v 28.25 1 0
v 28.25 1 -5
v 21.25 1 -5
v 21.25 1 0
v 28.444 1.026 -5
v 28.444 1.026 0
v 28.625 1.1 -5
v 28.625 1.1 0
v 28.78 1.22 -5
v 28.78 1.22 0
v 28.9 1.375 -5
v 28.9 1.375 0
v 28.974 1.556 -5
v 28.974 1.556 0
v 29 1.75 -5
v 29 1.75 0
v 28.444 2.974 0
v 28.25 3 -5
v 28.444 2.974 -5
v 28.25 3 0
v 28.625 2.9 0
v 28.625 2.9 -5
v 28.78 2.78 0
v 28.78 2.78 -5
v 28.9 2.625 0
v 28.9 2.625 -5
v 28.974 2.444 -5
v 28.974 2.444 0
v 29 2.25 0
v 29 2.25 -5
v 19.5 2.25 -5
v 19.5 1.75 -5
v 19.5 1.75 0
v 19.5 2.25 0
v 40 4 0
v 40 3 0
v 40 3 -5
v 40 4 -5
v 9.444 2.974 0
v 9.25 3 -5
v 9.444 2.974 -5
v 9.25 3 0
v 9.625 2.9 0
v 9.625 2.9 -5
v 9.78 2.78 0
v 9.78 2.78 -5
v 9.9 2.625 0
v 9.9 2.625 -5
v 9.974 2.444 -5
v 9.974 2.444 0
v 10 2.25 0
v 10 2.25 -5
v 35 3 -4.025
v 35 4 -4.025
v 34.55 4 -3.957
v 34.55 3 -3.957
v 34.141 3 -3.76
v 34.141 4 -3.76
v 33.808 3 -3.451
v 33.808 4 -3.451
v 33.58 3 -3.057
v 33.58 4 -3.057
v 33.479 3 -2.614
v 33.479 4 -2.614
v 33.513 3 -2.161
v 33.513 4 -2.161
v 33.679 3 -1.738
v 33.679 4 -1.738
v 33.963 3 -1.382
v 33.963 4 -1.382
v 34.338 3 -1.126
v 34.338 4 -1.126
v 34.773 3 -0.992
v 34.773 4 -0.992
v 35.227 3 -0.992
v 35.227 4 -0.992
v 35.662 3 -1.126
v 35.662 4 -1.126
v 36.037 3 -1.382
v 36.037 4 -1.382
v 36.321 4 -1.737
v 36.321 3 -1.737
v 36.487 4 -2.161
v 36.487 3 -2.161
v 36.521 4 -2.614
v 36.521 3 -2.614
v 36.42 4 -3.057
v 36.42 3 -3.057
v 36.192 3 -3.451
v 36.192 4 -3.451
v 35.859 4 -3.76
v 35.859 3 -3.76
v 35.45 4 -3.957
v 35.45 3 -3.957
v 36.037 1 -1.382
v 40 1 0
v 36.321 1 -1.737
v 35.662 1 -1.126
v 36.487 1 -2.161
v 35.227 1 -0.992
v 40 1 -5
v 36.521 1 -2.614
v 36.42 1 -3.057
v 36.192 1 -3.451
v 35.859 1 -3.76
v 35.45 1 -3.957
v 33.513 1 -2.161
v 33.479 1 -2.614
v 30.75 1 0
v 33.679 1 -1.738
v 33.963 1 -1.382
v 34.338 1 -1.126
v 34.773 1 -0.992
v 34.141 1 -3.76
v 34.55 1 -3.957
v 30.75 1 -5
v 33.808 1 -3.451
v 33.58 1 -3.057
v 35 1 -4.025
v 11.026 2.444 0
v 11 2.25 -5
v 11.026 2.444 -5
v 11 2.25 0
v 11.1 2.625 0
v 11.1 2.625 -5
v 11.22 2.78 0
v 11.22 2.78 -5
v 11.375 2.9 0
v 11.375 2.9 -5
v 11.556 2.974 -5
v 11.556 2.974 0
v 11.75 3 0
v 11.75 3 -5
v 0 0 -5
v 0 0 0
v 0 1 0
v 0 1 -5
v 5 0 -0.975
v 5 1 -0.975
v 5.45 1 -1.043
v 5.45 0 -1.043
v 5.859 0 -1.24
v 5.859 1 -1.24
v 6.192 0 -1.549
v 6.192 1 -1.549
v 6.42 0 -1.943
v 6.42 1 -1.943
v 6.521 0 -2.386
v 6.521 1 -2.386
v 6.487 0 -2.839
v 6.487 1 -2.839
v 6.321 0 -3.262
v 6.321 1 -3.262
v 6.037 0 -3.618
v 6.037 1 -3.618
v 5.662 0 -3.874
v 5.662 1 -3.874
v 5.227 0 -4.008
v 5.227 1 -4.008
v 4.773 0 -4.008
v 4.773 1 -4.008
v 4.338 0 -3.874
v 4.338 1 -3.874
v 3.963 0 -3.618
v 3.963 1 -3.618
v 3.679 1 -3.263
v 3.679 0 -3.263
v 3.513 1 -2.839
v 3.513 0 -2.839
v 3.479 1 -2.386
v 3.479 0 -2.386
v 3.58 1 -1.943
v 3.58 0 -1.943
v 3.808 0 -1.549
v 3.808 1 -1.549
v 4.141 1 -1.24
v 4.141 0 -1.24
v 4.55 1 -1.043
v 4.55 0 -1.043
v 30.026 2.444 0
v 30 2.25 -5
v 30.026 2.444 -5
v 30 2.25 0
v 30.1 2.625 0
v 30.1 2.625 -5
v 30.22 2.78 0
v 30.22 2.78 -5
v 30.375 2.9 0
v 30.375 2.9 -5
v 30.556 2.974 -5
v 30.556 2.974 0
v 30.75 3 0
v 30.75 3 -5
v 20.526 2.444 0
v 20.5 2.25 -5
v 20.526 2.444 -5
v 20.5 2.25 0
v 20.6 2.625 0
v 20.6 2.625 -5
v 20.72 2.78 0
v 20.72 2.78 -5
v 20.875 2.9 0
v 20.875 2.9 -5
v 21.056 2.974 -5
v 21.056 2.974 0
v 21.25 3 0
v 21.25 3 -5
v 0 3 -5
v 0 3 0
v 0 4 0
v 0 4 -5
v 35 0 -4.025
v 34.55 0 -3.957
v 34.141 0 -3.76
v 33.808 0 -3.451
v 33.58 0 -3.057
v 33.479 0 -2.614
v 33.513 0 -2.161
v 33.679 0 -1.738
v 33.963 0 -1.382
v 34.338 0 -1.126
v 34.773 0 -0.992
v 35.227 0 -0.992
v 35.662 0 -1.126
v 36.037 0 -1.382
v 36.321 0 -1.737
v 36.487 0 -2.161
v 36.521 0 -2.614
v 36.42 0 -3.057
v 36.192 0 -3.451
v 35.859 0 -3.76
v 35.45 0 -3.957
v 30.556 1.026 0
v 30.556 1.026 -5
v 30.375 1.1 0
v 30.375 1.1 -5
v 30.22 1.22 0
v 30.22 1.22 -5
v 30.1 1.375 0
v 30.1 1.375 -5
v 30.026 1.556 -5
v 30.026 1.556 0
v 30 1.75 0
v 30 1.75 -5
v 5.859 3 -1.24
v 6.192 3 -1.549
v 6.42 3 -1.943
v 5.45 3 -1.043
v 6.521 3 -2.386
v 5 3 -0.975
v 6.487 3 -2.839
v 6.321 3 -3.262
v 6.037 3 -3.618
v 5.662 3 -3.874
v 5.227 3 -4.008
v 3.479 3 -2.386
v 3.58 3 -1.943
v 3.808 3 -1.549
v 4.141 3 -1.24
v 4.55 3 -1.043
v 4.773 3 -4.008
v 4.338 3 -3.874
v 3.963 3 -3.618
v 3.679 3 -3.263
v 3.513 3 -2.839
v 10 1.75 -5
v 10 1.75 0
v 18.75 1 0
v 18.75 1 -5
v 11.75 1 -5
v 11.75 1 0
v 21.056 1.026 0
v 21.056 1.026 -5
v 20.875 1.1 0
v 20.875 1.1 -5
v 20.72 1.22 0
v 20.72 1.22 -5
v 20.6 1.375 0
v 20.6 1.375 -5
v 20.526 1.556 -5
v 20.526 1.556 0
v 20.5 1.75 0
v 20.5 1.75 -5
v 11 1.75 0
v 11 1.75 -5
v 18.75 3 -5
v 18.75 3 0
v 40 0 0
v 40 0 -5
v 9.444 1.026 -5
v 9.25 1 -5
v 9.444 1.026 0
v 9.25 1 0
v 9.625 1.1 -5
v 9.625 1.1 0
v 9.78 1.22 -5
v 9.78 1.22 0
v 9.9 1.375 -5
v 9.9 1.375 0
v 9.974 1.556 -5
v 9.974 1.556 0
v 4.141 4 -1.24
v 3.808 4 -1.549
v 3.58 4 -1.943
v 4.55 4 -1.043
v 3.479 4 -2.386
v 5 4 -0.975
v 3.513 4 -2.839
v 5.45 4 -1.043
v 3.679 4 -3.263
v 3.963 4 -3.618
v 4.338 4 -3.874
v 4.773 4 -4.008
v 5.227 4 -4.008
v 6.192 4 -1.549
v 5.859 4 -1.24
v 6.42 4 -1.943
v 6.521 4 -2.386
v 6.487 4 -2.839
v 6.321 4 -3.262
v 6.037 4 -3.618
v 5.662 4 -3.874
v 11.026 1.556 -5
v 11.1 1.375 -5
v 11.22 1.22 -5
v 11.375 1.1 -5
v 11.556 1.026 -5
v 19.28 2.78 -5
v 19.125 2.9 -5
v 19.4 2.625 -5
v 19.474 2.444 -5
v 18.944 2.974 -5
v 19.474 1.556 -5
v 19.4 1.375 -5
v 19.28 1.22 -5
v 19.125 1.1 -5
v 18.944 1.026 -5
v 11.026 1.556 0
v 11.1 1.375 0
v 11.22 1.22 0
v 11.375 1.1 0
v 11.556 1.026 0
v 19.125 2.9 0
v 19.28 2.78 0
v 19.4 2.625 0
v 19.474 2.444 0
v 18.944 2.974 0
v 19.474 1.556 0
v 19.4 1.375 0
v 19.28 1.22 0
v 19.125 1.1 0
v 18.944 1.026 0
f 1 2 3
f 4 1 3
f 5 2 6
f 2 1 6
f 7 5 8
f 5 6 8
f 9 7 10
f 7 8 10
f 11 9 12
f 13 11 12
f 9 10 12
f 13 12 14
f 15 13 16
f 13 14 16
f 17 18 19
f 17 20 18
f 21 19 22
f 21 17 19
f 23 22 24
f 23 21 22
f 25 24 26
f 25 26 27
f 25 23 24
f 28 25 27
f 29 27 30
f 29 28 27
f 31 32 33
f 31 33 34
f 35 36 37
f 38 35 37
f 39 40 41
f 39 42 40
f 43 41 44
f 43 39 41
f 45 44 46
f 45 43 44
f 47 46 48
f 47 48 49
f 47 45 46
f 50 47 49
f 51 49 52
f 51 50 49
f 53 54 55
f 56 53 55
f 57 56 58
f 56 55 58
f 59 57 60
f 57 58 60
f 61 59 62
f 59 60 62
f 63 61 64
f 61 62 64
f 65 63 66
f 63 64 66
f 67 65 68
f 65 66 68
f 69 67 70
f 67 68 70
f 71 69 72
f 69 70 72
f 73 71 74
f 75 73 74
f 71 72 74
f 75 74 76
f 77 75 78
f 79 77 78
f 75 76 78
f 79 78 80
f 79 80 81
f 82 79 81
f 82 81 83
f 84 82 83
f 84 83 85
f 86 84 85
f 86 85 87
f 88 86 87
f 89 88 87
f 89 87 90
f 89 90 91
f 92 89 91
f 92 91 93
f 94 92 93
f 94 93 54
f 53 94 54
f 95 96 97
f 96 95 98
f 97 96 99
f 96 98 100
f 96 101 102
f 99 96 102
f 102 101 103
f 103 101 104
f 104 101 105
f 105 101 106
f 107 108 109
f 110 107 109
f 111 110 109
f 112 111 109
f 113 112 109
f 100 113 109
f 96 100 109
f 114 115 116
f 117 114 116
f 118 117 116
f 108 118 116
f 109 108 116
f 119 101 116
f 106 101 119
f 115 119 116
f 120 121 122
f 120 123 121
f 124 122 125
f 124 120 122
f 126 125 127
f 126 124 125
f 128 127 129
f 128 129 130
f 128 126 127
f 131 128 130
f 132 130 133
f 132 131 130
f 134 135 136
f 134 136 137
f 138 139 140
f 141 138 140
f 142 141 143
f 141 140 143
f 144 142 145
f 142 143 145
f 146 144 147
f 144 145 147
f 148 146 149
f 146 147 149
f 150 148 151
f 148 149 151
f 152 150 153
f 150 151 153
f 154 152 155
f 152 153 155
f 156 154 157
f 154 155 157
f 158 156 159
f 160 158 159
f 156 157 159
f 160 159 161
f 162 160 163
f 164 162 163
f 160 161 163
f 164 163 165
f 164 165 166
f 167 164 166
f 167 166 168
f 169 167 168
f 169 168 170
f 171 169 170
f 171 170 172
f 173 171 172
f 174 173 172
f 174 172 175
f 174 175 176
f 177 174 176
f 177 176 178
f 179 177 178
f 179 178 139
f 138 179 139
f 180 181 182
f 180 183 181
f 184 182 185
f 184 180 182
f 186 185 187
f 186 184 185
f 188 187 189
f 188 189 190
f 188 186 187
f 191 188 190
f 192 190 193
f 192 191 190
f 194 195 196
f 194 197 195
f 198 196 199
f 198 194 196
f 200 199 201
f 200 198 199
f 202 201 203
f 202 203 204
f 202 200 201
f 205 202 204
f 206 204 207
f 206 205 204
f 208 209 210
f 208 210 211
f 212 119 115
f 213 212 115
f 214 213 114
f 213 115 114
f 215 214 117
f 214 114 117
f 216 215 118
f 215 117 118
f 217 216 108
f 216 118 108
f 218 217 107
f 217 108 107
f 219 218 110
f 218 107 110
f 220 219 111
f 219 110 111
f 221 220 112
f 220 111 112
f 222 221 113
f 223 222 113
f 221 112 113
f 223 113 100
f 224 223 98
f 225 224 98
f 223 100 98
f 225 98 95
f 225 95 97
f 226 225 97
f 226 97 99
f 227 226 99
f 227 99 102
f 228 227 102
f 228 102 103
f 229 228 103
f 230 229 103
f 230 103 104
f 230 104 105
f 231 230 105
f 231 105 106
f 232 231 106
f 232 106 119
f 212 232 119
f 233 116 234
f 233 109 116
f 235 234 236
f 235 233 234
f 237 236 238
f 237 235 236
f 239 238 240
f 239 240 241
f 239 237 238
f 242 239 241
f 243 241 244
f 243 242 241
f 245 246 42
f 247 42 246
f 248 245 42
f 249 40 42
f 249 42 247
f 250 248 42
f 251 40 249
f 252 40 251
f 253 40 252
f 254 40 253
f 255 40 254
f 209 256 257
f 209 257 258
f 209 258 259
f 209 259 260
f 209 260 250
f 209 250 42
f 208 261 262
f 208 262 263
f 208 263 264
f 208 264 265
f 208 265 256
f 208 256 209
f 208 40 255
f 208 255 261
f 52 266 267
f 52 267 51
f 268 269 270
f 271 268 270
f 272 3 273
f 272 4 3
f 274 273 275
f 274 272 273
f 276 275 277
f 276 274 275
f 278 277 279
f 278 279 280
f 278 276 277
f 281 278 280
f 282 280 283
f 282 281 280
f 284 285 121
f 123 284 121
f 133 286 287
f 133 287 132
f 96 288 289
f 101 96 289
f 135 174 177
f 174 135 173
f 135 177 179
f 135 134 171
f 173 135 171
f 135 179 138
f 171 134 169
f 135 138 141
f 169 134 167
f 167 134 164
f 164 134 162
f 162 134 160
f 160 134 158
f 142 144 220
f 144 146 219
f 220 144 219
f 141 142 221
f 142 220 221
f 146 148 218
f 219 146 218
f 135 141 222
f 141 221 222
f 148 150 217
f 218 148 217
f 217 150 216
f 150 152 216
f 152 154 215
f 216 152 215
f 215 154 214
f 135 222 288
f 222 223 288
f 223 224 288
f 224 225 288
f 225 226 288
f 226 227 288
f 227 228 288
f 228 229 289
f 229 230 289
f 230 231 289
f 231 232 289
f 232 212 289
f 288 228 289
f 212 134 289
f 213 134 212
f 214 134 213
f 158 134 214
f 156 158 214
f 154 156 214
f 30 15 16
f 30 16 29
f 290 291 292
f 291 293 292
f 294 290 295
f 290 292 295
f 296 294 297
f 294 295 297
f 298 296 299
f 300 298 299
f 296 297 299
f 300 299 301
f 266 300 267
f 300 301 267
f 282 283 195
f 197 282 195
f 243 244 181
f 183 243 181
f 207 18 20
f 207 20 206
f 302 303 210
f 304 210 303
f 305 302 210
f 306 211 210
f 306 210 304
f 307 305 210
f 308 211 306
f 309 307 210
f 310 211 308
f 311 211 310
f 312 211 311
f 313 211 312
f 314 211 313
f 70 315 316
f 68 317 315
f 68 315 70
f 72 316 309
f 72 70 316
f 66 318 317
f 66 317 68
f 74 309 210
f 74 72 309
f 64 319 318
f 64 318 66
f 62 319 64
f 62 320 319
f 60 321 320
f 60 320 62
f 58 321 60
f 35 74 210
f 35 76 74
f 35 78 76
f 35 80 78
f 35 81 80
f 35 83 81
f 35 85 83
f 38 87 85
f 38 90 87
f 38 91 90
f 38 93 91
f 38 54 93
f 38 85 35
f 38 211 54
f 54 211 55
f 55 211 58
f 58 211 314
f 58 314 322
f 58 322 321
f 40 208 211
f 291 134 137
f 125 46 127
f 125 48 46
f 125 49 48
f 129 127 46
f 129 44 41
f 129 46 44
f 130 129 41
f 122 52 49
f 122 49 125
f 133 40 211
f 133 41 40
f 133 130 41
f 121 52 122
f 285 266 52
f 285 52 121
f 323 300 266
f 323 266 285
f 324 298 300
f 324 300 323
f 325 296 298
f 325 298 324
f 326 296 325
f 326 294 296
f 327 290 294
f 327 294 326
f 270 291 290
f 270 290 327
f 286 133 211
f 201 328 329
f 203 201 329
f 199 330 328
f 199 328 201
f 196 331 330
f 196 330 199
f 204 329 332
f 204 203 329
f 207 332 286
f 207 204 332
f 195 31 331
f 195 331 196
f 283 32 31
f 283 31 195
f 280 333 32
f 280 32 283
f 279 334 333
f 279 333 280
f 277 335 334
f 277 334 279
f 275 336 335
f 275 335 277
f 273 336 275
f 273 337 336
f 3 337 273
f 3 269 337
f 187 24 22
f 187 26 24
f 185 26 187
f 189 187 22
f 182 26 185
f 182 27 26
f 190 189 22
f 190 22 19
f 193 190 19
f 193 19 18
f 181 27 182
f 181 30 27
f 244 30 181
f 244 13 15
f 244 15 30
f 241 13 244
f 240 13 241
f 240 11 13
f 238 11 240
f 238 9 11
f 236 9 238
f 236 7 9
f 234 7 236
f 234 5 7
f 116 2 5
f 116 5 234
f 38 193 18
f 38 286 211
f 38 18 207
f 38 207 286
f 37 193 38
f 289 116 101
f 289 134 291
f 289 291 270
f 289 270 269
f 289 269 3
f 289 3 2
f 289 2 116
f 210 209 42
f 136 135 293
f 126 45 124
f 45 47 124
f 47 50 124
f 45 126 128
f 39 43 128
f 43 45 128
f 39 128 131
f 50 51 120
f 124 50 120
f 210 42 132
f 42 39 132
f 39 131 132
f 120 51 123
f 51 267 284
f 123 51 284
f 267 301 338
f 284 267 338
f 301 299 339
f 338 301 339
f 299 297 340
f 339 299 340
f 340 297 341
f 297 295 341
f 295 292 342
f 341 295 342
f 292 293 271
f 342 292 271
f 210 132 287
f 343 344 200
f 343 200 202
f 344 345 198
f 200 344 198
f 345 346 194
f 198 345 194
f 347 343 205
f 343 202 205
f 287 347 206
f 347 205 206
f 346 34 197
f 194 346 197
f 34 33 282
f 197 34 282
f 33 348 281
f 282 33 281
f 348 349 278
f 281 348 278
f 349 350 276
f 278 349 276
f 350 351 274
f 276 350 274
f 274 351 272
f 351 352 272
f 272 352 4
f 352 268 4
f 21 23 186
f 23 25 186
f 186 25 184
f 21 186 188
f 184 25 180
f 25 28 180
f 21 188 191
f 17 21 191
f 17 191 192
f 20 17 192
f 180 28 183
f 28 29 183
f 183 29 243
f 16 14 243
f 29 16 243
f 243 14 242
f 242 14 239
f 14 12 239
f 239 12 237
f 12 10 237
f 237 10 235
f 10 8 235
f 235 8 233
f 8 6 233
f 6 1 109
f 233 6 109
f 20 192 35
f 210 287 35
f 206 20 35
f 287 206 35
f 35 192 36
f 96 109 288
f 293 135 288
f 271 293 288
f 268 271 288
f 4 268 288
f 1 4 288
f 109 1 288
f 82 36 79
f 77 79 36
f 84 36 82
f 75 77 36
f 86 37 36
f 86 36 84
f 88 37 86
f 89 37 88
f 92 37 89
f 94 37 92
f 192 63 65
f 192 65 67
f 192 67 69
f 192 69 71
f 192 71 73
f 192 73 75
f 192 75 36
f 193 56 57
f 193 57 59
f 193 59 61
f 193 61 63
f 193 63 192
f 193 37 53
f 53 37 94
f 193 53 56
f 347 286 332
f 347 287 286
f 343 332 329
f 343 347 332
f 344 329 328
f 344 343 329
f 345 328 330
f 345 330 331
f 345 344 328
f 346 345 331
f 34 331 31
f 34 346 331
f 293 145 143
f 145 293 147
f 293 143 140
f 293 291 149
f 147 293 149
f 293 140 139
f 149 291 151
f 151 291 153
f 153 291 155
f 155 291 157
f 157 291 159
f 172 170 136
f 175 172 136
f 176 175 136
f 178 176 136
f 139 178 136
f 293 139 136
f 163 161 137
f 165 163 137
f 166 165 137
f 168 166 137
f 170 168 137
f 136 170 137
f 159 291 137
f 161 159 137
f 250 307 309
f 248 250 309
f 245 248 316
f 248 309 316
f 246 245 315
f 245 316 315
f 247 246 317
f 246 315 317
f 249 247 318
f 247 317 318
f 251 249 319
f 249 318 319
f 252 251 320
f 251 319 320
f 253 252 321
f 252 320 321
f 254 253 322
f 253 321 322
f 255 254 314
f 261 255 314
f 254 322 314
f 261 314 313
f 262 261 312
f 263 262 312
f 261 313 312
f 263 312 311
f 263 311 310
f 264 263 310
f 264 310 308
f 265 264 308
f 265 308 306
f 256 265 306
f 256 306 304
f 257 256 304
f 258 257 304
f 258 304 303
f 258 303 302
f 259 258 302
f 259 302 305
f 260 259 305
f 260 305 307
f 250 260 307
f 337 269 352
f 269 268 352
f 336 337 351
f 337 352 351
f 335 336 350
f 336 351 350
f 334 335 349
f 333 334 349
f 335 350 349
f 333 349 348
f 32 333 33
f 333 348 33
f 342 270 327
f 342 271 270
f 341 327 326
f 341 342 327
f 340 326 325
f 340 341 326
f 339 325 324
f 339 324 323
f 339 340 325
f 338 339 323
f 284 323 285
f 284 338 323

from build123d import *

# Parameters (mm, degrees)
SKETCH1_W           = 40
SKETCH1_H           = 5
BOSS_EXTRUDE1_DEPTH = 4
SKETCH2_R           = 1.525
CUT_EXTRUDE1_DEPTH  = 41.509258201
SKETCH3_W           = 10
SKETCH3_H           = 2
SKETCH3_W_2         = 8.5
CUT_EXTRUDE2_DEPTH  = 41.509258201
FILLET1_R           = 0.75


with BuildPart() as part:
    # Sketch1 → Boss-Extrude1 (new body)
    with BuildSketch(Plane(origin=(0, 0, 0), x_dir=(1, 0, 0), z_dir=(0, 1, 0))):
        with Locations((20, 2.5)):
            Rectangle(SKETCH1_W, SKETCH1_H)
    extrude(amount=BOSS_EXTRUDE1_DEPTH)

    # Sketch2 → Cut-Extrude1 (cut, through all)
    with BuildSketch(Plane(origin=(0, 4, 0), x_dir=(1, 0, 0), z_dir=(0, 1, 0))):
        with Locations(Location((5, 2.5, 0), (0, 0, 270))):
            Circle(SKETCH2_R)
        with Locations(Location((35, 2.5, 0), (0, 0, 90))):
            Circle(SKETCH2_R)
    extrude(amount=-CUT_EXTRUDE1_DEPTH, mode=Mode.SUBTRACT)

    # Sketch3 → Cut-Extrude2 (cut, through all)
    with BuildSketch(Plane(origin=(0, 0, -5), x_dir=(-1, 0, 0), z_dir=(0, 0, -1))):
        with Locations((-35, 2)):
            Rectangle(SKETCH3_W, SKETCH3_H)
        with Locations((-24.75, 2)):
            Rectangle(SKETCH3_W_2, SKETCH3_H)
        with Locations((-15.25, 2)):
            Rectangle(SKETCH3_W_2, SKETCH3_H)
        with Locations((-5, 2)):
            Rectangle(SKETCH3_W, SKETCH3_H)
    extrude(amount=-CUT_EXTRUDE2_DEPTH, mode=Mode.SUBTRACT)

    # Fillet1
    fillet1_edges = [part.edges().sort_by_distance(p)[0] for p in [
        (30, 1, -2.5),
        (30, 3, -2.5),
        (29, 1, -2.5),
        (29, 3, -2.5),
        (20.5, 3, -2.5),
        (20.5, 1, -2.5),
        (19.5, 3, -2.5),
        (11, 3, -2.5),
        (11, 1, -2.5),
        (19.5, 1, -2.5),
        (10, 3, -2.5),
        (10, 1, -2.5),
    ]]
    fillet(fillet1_edges, radius=FILLET1_R)


solid = part.part
